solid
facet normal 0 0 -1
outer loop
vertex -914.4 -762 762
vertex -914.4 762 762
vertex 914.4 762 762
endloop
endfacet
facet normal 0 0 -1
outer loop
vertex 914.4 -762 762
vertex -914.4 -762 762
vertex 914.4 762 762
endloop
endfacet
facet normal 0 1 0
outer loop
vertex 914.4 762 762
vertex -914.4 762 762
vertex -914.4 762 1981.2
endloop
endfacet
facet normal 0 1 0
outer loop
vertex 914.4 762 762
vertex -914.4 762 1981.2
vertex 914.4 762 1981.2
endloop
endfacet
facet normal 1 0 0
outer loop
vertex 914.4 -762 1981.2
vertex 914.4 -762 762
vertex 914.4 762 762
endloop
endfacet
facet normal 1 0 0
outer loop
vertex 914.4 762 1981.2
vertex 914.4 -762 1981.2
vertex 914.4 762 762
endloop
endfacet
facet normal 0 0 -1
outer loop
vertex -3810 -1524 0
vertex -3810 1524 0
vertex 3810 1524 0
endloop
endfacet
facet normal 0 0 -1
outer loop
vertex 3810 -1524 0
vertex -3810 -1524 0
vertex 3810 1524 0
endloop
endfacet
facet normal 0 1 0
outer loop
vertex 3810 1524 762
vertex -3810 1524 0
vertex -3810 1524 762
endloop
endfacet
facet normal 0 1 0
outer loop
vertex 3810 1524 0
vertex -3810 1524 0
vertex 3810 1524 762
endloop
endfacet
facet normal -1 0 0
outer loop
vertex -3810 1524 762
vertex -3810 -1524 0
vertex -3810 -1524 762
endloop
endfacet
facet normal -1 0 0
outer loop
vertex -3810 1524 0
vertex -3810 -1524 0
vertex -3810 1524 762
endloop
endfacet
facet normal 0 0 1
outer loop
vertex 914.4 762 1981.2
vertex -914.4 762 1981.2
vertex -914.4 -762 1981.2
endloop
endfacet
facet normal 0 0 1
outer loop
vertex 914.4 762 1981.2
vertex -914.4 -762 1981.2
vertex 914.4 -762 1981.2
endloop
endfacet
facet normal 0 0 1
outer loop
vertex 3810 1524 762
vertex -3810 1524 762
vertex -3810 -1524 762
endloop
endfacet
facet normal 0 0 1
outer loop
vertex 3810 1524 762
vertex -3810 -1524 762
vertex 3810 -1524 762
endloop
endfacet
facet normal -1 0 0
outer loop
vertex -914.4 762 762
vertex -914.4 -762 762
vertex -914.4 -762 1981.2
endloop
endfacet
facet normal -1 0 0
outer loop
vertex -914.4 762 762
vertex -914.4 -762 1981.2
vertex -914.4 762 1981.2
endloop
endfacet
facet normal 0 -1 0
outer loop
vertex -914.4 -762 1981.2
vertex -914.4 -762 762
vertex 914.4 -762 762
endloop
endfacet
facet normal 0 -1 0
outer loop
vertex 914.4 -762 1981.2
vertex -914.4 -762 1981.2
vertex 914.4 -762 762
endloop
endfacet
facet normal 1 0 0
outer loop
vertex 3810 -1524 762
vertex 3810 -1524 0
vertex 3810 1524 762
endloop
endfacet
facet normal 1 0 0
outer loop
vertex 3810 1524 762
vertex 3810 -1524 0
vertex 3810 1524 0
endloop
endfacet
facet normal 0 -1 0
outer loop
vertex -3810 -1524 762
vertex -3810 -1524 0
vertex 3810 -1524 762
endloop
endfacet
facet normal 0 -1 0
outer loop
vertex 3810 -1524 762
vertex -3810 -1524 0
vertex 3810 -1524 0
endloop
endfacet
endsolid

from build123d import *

# Parameters (mm, degrees)
F0_W     = 7620
F0_H     = 3048
F1_DEPTH = 762
F2_W     = 1828.8
F2_H     = 1524
F3_DEPTH = 1219.2


with BuildPart() as f1:
    # F0 (on Top) → F1 (new body)
    with BuildSketch(Plane.XY):
        Rectangle(F0_W, F0_H)
    extrude(amount=F1_DEPTH)


with BuildPart() as f3:
    # F2 (on face) → F3 (new body)
    with BuildSketch(Plane.XY.offset(762)):
        Rectangle(F2_W, F2_H)
    extrude(amount=F3_DEPTH)


solid = Compound([f1.part, f3.part])
